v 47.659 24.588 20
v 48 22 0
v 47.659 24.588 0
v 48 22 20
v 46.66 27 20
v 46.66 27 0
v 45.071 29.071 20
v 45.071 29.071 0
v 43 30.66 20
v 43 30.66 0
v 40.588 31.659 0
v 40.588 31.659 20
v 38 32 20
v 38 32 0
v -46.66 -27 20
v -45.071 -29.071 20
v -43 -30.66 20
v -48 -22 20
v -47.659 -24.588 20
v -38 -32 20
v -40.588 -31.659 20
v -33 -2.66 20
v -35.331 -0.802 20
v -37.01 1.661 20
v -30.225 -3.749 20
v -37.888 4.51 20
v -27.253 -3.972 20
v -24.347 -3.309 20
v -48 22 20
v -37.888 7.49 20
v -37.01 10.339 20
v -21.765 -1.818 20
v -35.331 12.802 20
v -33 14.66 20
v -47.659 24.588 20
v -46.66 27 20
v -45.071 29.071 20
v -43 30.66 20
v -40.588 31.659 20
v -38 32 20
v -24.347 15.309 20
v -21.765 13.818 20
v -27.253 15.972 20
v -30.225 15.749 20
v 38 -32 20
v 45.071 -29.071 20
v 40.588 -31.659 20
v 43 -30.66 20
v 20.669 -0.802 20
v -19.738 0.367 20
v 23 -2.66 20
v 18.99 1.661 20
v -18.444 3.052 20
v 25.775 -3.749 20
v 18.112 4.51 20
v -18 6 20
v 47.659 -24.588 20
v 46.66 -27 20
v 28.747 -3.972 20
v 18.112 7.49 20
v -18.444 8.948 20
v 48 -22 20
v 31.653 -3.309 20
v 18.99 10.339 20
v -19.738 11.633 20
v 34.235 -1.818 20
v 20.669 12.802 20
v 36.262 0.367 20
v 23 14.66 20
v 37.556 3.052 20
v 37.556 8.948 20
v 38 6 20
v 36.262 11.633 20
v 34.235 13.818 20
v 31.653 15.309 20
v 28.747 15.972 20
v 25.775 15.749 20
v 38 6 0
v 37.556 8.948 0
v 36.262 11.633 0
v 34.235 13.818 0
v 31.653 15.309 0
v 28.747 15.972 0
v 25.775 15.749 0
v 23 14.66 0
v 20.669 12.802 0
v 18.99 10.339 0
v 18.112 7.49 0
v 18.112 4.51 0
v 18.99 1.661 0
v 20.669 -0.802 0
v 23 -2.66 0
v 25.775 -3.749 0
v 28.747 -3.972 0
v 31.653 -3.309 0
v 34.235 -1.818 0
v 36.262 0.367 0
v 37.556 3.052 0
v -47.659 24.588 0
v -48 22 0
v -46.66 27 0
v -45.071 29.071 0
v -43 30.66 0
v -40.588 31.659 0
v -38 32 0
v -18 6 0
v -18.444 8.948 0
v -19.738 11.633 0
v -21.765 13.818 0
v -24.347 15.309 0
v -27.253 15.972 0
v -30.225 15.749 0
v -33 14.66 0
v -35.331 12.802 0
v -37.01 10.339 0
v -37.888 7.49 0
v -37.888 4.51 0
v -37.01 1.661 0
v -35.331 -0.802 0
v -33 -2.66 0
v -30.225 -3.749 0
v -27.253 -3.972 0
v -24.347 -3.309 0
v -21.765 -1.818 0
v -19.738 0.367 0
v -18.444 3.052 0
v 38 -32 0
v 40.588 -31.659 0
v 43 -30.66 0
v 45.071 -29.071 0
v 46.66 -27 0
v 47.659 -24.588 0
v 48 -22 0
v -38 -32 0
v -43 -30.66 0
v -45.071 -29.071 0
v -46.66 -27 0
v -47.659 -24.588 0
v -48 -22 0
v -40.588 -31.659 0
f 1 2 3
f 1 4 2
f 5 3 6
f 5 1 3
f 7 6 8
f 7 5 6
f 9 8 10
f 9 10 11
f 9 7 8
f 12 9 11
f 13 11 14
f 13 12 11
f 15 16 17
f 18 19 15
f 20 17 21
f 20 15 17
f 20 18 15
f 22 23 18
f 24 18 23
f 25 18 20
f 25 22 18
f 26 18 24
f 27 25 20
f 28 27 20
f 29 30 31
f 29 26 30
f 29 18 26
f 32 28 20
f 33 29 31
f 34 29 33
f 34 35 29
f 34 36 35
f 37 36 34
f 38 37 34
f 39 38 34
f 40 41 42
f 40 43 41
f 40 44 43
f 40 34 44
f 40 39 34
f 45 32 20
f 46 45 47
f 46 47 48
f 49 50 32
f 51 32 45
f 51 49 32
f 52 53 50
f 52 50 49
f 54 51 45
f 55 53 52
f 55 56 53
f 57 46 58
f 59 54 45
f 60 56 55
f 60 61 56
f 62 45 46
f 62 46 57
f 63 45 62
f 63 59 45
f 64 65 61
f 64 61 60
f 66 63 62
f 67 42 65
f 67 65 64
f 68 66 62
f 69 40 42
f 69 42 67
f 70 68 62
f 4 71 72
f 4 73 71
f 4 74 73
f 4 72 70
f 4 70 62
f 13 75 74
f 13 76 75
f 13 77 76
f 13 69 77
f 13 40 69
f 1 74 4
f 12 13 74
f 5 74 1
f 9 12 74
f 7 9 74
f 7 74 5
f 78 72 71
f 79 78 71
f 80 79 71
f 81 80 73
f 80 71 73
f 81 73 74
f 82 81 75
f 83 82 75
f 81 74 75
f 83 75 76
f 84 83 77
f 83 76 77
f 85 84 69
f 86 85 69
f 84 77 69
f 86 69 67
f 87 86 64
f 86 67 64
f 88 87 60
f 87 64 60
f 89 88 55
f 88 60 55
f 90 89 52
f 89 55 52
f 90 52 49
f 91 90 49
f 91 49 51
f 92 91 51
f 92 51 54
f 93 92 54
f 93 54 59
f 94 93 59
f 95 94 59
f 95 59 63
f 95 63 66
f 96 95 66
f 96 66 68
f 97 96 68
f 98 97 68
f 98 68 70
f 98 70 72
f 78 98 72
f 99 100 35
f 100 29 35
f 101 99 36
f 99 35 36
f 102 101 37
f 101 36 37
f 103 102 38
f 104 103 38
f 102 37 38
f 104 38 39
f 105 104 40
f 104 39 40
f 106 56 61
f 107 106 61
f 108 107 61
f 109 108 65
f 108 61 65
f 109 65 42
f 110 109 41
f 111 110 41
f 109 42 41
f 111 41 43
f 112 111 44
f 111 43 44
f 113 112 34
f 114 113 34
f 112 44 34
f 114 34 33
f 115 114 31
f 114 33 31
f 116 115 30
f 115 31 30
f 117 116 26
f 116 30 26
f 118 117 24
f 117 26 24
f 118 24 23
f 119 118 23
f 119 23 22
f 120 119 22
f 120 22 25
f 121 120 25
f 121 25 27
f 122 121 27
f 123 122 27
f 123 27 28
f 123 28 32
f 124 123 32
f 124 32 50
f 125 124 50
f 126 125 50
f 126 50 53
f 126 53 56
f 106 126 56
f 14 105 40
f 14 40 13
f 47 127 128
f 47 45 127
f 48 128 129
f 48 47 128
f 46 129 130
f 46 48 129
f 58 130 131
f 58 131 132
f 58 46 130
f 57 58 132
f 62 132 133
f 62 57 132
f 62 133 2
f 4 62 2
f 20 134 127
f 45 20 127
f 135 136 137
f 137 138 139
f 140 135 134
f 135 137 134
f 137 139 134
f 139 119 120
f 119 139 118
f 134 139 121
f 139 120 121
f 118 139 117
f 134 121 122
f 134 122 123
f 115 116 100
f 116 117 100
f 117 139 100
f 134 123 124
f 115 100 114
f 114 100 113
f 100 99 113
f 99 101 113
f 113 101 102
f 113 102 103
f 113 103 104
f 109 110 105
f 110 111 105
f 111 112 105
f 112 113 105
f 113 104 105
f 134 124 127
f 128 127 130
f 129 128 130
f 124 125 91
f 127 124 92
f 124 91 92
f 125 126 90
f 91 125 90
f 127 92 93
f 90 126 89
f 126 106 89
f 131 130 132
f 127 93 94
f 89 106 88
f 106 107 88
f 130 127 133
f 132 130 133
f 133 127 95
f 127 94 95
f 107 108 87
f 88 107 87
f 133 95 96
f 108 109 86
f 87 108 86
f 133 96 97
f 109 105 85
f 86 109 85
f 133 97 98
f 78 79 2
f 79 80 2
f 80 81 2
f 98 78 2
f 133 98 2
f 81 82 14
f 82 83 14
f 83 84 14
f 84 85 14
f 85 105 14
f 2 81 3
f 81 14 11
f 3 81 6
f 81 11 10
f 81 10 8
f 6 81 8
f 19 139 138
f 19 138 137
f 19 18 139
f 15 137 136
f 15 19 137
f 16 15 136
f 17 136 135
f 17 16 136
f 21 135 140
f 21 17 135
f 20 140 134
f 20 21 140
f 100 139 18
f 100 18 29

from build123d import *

# Parameters (mm, degrees)
F0_W     = 96
F0_H     = 64
F1_DEPTH = 20
F2_R     = 10
F3_R     = 10
F4_DEPTH = 25
F5_DEPTH = 55.9


with BuildPart() as f1:
    # F0 (on Top) → F1 (new body)
    with BuildSketch(Plane.XY):
        Rectangle(F0_W, F0_H)
    extrude(amount=F1_DEPTH)

    # F2
    f2_edges = [f1.edges().sort_by_distance(p)[0] for p in [
        (48, -32, 10),
        (48, 32, 10),
        (-48, 32, 10),
        (-48, -32, 10),
    ]]
    fillet(f2_edges, radius=F2_R)

    # F3 (on face) → F4 (cut)
    with BuildSketch(Plane.XY.offset(20)):
        with Locations((28, 6)):
            Circle(F3_R)
    extrude(amount=-F4_DEPTH, mode=Mode.SUBTRACT)

    # F3 (on face) → F5 (cut)
    with BuildSketch(Plane.XY.offset(20)):
        with Locations((-28, 6)):
            Circle(F3_R)
    extrude(amount=-F5_DEPTH, mode=Mode.SUBTRACT)


solid = f1.part
